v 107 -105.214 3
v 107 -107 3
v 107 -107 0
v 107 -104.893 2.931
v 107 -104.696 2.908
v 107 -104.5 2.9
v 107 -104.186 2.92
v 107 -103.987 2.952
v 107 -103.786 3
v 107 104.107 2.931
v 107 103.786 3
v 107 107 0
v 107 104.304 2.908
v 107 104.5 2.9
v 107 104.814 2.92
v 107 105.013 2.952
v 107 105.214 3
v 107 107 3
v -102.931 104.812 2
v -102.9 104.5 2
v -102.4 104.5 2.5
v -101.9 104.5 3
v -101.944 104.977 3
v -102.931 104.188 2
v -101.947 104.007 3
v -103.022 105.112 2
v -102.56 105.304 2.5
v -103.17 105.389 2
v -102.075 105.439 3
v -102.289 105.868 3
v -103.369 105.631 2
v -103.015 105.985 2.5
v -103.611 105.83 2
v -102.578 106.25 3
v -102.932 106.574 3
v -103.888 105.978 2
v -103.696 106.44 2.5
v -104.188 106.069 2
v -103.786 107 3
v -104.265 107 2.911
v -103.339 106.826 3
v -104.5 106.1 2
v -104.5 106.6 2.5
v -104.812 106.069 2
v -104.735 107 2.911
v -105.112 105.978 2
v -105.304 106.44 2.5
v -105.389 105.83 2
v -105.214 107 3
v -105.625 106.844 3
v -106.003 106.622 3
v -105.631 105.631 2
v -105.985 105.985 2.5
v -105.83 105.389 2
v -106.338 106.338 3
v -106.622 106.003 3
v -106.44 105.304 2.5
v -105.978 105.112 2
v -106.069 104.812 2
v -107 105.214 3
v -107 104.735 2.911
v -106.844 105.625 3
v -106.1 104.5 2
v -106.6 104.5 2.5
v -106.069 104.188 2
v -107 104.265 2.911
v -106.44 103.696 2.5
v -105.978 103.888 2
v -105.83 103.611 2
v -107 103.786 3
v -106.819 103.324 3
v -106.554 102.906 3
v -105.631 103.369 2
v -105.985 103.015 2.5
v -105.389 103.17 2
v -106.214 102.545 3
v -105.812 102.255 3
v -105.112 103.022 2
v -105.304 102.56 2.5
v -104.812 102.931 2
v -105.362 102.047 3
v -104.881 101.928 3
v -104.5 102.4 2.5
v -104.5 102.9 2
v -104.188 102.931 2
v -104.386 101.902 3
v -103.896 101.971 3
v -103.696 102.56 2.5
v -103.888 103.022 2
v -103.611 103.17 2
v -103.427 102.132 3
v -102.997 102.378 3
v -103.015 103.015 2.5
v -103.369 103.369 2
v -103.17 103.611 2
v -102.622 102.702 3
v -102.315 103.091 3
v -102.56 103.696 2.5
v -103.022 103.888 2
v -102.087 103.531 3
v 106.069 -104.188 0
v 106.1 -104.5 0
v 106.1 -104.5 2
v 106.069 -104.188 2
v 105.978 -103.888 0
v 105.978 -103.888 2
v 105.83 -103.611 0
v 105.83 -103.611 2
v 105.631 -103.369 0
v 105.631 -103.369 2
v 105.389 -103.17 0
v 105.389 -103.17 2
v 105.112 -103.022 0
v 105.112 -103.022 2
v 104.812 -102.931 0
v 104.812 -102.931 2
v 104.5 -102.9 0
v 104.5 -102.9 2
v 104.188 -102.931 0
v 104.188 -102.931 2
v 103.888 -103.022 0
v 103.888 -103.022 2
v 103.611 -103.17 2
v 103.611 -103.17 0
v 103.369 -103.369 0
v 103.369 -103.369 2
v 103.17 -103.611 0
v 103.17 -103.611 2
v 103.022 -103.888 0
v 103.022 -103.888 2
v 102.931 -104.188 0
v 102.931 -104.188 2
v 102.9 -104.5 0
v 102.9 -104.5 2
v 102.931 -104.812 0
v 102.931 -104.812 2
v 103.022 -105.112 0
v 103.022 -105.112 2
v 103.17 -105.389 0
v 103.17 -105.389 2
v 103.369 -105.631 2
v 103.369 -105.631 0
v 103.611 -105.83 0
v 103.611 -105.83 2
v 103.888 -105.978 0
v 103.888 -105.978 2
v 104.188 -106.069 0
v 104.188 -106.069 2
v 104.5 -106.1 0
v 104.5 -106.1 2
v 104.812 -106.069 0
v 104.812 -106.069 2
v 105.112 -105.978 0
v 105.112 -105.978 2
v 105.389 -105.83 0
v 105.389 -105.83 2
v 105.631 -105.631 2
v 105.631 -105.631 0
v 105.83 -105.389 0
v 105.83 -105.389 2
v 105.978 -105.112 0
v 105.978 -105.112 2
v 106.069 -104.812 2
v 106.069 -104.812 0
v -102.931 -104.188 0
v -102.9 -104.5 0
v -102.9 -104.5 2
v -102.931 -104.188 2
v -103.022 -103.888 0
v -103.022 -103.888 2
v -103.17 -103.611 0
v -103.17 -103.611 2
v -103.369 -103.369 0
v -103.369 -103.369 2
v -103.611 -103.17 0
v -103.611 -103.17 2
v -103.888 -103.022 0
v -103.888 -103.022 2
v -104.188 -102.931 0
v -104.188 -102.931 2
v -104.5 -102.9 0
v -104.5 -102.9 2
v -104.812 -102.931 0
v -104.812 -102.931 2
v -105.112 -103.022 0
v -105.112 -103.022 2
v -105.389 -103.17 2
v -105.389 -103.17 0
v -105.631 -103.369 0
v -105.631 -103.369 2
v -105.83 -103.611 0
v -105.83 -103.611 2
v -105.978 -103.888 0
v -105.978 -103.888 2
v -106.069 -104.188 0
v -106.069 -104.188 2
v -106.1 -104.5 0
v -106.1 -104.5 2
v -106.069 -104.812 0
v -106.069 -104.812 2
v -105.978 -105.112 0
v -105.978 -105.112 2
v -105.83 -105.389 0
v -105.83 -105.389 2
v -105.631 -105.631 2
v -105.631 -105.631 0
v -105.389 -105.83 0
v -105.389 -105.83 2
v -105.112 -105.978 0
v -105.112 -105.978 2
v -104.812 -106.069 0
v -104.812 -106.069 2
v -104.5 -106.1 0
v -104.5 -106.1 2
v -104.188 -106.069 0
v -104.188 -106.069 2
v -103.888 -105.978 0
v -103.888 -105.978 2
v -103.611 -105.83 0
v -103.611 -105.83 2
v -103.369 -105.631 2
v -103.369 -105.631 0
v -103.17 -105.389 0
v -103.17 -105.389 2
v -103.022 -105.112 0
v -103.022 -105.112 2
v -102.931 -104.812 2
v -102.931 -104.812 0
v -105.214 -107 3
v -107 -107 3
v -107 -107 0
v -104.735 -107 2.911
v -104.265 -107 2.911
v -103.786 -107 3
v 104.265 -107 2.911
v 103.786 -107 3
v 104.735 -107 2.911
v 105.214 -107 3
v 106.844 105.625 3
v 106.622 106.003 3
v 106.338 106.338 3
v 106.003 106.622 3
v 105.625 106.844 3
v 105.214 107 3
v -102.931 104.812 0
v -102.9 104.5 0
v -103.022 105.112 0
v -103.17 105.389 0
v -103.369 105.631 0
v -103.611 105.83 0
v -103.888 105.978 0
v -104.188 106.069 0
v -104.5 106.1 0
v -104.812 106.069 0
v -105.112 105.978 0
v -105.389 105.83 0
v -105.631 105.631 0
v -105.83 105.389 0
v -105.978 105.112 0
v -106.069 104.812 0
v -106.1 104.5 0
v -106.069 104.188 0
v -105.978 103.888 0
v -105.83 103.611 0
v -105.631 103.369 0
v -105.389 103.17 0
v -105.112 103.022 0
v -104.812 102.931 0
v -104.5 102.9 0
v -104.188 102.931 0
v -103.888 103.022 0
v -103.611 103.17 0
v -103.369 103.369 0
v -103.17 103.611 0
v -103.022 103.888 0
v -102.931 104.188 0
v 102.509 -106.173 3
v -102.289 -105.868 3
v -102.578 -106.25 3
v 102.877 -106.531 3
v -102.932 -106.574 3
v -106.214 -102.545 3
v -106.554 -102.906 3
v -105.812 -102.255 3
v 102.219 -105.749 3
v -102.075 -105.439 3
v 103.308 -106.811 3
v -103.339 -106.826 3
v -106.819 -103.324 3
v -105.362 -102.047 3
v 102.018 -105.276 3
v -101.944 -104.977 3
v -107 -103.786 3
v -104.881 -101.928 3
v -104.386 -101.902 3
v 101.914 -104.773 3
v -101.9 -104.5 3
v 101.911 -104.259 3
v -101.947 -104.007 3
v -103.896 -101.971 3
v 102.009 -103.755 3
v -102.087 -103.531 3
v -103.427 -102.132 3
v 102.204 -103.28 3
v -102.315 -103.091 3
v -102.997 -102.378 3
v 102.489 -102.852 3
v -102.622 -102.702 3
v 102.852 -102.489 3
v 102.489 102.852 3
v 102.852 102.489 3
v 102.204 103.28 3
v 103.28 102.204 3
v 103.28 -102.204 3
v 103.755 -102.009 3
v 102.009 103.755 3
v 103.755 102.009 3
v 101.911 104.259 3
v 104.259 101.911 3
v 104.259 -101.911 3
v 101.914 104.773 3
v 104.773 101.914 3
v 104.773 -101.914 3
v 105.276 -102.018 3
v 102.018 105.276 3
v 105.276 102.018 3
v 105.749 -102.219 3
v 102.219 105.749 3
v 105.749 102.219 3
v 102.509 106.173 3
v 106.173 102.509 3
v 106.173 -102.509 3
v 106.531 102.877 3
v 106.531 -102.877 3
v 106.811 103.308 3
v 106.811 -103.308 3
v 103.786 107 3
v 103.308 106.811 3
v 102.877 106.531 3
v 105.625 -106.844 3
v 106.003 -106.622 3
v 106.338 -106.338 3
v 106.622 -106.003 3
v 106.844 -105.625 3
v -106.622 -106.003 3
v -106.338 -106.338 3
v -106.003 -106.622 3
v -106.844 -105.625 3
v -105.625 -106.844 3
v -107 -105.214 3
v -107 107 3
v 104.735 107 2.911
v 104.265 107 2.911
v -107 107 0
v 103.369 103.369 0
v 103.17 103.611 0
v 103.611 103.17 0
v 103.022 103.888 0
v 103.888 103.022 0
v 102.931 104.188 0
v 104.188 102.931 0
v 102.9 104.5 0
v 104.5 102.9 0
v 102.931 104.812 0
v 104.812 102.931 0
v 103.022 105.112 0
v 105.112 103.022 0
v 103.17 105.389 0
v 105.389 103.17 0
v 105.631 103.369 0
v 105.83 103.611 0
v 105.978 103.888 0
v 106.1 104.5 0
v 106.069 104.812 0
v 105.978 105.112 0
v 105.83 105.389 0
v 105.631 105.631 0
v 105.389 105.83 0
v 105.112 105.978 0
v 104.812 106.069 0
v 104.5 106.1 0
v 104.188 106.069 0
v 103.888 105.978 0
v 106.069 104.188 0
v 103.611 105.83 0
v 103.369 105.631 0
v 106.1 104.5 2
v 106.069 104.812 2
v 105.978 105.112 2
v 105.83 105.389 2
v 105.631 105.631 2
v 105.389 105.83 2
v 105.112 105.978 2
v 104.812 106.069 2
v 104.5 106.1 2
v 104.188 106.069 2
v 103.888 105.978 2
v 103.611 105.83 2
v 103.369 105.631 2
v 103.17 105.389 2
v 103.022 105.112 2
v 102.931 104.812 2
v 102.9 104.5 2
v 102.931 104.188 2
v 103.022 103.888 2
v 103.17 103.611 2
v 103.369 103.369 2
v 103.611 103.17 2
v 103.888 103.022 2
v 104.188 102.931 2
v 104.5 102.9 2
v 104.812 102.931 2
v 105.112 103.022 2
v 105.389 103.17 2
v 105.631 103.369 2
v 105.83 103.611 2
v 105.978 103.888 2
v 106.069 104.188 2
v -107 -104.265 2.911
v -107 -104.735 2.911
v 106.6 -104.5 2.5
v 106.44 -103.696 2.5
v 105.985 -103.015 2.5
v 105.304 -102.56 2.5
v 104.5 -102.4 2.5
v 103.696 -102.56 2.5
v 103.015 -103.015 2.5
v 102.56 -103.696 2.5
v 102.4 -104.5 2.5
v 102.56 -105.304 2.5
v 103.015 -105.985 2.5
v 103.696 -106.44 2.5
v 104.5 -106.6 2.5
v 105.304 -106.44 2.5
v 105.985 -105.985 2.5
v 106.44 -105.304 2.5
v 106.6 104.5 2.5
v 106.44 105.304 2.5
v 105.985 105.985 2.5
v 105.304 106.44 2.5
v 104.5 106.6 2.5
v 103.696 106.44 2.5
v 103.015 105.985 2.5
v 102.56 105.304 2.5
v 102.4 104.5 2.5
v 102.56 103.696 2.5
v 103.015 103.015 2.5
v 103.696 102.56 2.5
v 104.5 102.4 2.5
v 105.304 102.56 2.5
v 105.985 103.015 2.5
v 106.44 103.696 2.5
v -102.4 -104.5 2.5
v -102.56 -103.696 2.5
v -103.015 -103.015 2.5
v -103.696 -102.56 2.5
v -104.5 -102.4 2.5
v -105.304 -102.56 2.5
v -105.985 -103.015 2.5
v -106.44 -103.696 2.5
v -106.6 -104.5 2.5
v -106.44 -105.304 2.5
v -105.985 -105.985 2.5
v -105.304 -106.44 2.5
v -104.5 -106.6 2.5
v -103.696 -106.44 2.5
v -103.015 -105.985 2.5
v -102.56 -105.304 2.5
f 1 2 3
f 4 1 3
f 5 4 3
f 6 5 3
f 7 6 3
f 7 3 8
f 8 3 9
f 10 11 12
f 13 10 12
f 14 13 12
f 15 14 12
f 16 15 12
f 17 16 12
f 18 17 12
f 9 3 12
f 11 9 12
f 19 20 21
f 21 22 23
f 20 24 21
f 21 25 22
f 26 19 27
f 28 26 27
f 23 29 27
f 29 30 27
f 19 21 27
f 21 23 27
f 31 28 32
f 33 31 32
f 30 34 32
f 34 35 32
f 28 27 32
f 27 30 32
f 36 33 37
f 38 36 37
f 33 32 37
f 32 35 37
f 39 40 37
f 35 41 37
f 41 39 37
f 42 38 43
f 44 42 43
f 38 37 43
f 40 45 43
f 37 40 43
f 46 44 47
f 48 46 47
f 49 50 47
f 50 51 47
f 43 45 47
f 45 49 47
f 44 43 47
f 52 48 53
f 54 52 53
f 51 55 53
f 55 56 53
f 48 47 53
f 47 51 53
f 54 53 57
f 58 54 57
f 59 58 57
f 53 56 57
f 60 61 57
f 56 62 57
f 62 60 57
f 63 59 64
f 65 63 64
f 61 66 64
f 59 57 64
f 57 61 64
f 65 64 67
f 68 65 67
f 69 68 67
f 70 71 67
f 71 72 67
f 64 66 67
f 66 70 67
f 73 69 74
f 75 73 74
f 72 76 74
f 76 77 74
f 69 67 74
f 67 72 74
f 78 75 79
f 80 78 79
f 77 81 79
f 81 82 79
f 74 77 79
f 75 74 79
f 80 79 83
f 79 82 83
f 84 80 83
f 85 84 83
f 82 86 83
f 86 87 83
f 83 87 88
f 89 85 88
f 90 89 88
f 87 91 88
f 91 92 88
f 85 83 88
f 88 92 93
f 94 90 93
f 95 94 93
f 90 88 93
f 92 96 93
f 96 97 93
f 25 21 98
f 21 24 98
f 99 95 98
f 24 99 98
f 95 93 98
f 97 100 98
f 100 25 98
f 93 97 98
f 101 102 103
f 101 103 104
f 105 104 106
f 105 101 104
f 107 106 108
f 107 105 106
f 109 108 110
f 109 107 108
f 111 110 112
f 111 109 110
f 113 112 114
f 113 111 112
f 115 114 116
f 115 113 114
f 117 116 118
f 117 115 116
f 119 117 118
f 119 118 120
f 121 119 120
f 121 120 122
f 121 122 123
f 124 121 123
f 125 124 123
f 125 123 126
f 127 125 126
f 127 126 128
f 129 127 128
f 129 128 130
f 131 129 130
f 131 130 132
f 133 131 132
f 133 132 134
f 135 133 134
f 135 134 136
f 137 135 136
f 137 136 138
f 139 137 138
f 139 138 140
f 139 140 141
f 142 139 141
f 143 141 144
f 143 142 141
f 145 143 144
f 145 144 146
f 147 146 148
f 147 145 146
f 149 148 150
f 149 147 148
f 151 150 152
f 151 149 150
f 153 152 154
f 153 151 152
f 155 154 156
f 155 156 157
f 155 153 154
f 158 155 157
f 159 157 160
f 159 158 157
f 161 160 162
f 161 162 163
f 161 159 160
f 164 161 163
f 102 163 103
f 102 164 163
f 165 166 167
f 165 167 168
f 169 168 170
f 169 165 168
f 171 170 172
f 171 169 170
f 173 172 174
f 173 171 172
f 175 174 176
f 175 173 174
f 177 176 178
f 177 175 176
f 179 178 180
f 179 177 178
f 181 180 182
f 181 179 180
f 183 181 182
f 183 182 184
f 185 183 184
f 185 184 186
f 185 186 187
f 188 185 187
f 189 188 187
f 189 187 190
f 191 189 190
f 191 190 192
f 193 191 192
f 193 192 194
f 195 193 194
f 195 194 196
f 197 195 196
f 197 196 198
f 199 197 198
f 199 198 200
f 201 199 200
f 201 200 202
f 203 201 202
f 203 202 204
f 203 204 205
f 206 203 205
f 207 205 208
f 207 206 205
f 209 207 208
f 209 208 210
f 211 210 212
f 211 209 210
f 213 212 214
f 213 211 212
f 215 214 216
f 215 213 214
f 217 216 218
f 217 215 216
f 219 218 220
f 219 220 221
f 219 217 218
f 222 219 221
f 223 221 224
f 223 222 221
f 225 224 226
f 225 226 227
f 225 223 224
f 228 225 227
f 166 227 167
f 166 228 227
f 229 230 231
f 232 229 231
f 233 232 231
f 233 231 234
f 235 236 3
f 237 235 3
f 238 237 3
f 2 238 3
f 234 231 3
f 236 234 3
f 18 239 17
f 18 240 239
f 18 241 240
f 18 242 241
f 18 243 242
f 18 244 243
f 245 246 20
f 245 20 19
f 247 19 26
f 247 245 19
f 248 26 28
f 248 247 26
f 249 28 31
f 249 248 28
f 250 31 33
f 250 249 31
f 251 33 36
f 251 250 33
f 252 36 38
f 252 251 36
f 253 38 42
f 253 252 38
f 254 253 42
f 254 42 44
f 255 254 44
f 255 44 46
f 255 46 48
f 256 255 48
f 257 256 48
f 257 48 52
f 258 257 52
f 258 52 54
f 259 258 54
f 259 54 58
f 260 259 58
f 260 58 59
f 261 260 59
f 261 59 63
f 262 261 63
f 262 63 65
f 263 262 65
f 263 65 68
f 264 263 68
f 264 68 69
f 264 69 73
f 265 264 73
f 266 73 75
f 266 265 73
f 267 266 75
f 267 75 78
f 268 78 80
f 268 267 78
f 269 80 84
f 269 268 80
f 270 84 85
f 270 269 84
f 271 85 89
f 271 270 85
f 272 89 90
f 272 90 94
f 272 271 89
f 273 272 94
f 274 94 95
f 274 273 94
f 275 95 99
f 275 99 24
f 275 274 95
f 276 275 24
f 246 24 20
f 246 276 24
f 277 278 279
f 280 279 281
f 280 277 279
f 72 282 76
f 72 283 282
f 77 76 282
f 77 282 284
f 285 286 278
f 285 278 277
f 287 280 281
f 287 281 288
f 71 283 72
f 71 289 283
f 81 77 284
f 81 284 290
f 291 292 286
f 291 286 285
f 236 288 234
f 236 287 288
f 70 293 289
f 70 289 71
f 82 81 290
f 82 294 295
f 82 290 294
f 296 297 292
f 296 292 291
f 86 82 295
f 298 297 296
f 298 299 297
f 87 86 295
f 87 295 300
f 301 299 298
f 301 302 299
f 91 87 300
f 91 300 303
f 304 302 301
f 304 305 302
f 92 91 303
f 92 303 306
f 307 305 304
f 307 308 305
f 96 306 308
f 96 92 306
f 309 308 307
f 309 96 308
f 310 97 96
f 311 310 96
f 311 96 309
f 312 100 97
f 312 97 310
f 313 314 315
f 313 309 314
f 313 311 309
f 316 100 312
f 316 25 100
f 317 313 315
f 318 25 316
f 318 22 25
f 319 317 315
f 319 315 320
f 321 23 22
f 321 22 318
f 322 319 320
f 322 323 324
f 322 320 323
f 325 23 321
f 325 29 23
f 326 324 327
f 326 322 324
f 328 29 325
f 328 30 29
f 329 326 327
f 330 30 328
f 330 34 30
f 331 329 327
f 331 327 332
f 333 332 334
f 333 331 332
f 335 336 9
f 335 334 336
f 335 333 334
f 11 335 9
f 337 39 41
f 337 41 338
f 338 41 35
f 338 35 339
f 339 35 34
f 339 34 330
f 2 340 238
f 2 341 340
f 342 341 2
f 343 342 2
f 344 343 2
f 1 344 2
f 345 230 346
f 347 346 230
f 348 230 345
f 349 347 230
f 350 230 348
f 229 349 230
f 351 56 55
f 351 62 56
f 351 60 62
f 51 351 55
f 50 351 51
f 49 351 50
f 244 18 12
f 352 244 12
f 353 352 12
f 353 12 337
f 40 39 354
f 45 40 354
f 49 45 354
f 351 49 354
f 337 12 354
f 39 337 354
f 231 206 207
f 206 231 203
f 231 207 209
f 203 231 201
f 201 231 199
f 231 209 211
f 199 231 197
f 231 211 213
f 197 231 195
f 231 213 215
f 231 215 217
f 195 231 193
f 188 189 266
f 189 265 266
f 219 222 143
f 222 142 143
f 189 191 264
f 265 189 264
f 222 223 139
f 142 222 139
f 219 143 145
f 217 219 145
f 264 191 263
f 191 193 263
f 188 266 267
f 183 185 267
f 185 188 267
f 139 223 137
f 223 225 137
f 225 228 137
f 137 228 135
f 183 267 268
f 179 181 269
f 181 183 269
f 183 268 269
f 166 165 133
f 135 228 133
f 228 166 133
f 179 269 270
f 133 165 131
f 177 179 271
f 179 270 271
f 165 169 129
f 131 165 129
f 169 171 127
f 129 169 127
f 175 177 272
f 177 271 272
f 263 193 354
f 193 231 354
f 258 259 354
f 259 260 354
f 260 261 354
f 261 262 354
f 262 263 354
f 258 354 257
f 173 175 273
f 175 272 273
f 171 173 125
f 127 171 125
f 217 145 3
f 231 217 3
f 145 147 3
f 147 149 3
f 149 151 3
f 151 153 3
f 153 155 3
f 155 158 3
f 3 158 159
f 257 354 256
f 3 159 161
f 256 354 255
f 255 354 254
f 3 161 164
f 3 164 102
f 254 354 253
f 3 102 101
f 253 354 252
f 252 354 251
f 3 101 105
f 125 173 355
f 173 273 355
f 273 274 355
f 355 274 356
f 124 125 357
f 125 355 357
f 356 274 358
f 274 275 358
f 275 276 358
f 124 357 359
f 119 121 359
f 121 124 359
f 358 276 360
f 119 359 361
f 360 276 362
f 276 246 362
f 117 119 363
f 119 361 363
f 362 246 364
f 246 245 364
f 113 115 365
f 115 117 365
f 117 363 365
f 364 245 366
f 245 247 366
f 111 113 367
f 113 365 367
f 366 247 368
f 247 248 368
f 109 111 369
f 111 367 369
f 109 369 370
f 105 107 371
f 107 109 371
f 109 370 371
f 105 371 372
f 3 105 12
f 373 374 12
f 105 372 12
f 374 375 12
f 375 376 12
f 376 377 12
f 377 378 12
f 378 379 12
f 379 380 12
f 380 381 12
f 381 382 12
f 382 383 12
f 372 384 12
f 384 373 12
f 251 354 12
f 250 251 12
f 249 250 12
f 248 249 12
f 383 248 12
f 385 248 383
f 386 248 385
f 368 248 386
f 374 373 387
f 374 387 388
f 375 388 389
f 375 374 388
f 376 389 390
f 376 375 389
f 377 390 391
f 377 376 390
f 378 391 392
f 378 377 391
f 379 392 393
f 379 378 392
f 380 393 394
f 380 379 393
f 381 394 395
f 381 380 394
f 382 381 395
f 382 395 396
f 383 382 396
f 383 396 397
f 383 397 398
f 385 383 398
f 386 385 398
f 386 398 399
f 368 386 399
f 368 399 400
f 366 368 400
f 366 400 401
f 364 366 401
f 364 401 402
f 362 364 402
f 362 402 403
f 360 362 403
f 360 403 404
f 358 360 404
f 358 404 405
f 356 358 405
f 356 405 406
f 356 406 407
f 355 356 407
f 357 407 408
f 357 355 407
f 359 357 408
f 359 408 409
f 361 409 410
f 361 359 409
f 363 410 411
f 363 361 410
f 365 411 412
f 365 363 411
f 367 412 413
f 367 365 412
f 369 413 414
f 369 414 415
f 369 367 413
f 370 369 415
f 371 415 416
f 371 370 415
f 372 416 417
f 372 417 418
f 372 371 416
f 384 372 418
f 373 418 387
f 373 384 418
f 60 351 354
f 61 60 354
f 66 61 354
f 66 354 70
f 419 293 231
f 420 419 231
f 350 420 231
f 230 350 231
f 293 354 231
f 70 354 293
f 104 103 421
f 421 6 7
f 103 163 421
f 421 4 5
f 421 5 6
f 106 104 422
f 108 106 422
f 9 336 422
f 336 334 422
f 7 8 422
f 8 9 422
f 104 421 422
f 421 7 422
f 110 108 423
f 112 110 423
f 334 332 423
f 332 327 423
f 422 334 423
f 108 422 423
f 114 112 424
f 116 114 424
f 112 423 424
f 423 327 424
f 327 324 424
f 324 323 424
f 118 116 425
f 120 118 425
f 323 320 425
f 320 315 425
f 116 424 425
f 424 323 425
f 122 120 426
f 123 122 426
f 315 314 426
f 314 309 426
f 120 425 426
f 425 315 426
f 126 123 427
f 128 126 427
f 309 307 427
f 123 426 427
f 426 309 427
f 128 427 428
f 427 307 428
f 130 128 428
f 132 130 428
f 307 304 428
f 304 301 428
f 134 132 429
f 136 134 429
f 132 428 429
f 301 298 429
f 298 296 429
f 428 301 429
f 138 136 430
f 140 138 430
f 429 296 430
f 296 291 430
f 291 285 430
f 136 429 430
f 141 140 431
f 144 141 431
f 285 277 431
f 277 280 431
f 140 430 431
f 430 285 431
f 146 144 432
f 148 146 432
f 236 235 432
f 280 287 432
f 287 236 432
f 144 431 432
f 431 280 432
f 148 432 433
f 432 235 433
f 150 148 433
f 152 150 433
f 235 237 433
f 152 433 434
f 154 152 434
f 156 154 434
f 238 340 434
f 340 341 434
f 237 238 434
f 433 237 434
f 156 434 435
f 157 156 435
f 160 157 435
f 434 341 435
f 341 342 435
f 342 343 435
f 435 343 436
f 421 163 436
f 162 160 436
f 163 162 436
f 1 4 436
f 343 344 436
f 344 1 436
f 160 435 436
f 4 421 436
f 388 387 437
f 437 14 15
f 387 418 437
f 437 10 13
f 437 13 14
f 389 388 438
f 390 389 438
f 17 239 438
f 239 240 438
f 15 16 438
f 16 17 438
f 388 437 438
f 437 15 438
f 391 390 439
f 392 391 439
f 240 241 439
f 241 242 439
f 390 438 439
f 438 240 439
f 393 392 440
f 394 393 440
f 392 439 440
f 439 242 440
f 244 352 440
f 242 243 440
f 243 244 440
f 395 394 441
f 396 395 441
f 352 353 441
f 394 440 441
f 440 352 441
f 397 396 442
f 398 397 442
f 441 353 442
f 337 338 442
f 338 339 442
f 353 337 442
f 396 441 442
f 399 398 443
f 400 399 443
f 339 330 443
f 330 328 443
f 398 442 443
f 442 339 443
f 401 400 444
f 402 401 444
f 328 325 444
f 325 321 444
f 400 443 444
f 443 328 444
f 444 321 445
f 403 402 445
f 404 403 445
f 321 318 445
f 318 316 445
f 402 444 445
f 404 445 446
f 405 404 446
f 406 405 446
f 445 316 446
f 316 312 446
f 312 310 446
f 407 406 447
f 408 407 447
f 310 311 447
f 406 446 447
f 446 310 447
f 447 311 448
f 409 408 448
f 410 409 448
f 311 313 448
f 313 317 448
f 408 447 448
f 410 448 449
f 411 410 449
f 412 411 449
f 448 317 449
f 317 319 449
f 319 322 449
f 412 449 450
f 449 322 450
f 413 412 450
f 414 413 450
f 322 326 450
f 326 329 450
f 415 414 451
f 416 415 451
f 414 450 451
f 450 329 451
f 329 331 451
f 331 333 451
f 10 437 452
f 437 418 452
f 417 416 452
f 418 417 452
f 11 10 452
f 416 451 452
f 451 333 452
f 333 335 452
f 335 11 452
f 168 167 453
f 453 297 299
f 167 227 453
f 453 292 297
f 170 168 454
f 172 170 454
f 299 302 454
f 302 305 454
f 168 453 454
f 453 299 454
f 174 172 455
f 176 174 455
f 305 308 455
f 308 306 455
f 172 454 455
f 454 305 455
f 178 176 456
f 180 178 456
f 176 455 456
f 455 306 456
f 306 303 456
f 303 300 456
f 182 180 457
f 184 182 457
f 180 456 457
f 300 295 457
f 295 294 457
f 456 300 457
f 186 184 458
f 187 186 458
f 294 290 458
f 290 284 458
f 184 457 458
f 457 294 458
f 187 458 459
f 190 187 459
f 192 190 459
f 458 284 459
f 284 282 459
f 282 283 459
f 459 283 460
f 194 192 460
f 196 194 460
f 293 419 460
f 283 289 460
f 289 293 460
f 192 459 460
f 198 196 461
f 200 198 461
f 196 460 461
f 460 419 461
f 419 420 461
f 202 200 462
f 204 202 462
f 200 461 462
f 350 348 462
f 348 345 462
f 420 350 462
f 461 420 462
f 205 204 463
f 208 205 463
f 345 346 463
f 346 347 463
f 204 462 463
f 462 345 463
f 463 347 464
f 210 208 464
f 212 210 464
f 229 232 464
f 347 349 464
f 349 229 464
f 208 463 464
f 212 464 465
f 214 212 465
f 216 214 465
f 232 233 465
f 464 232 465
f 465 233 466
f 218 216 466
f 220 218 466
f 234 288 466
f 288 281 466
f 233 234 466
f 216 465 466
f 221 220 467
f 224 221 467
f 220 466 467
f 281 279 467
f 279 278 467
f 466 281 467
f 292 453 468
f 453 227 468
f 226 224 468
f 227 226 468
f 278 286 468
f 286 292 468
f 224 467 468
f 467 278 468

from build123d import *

# Parameters (mm, degrees)
F0_R     = 1.6
F1_DEPTH = 3


# Not quite as in the source:
# - a fillet or chamfer that OpenCascade refuses, or shapes differently, is made with other operations: its cross-section is extruded or revolved along the edge and cut away or added


with BuildPart() as f1:
    # F0 (on Top) → F1 (new body)
    with BuildSketch(Plane.XY):
        Polygon((-107, 107), (-107, 0), (-107, -107), (0, -107), (107, -107), (107, 0), (107, 107), (0, 107), align=None)
        with Locations((-104.5, -104.5)):
            Circle(F0_R, mode=Mode.SUBTRACT)
        with Locations((104.5, -104.5)):
            Circle(F0_R, mode=Mode.SUBTRACT)
        with Locations((-104.5, 104.5)):
            Circle(F0_R, mode=Mode.SUBTRACT)
        with Locations((104.5, 104.5)):
            Circle(F0_R, mode=Mode.SUBTRACT)
    extrude(amount=F1_DEPTH)

    # F2: chamfer of 1 on 4 edges, made by hand

    # F2_s1 → F2_t2 (revolve, cut)
    with BuildSketch(Plane.XZ.offset(104.5)):
        Polygon((-102.9, 2), (-101.9, 3), (-102.9, 3), align=None)
    revolve(axis=Axis((-104.5, -104.5, 3), (0, 0, 1)), mode=Mode.SUBTRACT)

    # F2_s3 → F2_t4 (revolve, cut)
    with BuildSketch(Plane.XZ.offset(-104.5)):
        Polygon((-102.9, 2), (-101.9, 3), (-102.9, 3), align=None)
    revolve(axis=Axis((-104.5, 104.5, 3), (0, 0, 1)), mode=Mode.SUBTRACT)

    # F2_s5 → F2_t6 (revolve, cut)
    with BuildSketch(Plane.XZ.offset(-104.5)):
        Polygon((106.1, 2), (107.1, 3), (106.1, 3), align=None)
    revolve(axis=Axis((104.5, 104.5, 3), (0, 0, 1)), mode=Mode.SUBTRACT)

    # F2_s7 → F2_t8 (revolve, cut)
    with BuildSketch(Plane.XZ.offset(104.5)):
        Polygon((106.1, 2), (107.1, 3), (106.1, 3), align=None)
    revolve(axis=Axis((104.5, -104.5, 3), (0, 0, 1)), mode=Mode.SUBTRACT)


solid = f1.part
